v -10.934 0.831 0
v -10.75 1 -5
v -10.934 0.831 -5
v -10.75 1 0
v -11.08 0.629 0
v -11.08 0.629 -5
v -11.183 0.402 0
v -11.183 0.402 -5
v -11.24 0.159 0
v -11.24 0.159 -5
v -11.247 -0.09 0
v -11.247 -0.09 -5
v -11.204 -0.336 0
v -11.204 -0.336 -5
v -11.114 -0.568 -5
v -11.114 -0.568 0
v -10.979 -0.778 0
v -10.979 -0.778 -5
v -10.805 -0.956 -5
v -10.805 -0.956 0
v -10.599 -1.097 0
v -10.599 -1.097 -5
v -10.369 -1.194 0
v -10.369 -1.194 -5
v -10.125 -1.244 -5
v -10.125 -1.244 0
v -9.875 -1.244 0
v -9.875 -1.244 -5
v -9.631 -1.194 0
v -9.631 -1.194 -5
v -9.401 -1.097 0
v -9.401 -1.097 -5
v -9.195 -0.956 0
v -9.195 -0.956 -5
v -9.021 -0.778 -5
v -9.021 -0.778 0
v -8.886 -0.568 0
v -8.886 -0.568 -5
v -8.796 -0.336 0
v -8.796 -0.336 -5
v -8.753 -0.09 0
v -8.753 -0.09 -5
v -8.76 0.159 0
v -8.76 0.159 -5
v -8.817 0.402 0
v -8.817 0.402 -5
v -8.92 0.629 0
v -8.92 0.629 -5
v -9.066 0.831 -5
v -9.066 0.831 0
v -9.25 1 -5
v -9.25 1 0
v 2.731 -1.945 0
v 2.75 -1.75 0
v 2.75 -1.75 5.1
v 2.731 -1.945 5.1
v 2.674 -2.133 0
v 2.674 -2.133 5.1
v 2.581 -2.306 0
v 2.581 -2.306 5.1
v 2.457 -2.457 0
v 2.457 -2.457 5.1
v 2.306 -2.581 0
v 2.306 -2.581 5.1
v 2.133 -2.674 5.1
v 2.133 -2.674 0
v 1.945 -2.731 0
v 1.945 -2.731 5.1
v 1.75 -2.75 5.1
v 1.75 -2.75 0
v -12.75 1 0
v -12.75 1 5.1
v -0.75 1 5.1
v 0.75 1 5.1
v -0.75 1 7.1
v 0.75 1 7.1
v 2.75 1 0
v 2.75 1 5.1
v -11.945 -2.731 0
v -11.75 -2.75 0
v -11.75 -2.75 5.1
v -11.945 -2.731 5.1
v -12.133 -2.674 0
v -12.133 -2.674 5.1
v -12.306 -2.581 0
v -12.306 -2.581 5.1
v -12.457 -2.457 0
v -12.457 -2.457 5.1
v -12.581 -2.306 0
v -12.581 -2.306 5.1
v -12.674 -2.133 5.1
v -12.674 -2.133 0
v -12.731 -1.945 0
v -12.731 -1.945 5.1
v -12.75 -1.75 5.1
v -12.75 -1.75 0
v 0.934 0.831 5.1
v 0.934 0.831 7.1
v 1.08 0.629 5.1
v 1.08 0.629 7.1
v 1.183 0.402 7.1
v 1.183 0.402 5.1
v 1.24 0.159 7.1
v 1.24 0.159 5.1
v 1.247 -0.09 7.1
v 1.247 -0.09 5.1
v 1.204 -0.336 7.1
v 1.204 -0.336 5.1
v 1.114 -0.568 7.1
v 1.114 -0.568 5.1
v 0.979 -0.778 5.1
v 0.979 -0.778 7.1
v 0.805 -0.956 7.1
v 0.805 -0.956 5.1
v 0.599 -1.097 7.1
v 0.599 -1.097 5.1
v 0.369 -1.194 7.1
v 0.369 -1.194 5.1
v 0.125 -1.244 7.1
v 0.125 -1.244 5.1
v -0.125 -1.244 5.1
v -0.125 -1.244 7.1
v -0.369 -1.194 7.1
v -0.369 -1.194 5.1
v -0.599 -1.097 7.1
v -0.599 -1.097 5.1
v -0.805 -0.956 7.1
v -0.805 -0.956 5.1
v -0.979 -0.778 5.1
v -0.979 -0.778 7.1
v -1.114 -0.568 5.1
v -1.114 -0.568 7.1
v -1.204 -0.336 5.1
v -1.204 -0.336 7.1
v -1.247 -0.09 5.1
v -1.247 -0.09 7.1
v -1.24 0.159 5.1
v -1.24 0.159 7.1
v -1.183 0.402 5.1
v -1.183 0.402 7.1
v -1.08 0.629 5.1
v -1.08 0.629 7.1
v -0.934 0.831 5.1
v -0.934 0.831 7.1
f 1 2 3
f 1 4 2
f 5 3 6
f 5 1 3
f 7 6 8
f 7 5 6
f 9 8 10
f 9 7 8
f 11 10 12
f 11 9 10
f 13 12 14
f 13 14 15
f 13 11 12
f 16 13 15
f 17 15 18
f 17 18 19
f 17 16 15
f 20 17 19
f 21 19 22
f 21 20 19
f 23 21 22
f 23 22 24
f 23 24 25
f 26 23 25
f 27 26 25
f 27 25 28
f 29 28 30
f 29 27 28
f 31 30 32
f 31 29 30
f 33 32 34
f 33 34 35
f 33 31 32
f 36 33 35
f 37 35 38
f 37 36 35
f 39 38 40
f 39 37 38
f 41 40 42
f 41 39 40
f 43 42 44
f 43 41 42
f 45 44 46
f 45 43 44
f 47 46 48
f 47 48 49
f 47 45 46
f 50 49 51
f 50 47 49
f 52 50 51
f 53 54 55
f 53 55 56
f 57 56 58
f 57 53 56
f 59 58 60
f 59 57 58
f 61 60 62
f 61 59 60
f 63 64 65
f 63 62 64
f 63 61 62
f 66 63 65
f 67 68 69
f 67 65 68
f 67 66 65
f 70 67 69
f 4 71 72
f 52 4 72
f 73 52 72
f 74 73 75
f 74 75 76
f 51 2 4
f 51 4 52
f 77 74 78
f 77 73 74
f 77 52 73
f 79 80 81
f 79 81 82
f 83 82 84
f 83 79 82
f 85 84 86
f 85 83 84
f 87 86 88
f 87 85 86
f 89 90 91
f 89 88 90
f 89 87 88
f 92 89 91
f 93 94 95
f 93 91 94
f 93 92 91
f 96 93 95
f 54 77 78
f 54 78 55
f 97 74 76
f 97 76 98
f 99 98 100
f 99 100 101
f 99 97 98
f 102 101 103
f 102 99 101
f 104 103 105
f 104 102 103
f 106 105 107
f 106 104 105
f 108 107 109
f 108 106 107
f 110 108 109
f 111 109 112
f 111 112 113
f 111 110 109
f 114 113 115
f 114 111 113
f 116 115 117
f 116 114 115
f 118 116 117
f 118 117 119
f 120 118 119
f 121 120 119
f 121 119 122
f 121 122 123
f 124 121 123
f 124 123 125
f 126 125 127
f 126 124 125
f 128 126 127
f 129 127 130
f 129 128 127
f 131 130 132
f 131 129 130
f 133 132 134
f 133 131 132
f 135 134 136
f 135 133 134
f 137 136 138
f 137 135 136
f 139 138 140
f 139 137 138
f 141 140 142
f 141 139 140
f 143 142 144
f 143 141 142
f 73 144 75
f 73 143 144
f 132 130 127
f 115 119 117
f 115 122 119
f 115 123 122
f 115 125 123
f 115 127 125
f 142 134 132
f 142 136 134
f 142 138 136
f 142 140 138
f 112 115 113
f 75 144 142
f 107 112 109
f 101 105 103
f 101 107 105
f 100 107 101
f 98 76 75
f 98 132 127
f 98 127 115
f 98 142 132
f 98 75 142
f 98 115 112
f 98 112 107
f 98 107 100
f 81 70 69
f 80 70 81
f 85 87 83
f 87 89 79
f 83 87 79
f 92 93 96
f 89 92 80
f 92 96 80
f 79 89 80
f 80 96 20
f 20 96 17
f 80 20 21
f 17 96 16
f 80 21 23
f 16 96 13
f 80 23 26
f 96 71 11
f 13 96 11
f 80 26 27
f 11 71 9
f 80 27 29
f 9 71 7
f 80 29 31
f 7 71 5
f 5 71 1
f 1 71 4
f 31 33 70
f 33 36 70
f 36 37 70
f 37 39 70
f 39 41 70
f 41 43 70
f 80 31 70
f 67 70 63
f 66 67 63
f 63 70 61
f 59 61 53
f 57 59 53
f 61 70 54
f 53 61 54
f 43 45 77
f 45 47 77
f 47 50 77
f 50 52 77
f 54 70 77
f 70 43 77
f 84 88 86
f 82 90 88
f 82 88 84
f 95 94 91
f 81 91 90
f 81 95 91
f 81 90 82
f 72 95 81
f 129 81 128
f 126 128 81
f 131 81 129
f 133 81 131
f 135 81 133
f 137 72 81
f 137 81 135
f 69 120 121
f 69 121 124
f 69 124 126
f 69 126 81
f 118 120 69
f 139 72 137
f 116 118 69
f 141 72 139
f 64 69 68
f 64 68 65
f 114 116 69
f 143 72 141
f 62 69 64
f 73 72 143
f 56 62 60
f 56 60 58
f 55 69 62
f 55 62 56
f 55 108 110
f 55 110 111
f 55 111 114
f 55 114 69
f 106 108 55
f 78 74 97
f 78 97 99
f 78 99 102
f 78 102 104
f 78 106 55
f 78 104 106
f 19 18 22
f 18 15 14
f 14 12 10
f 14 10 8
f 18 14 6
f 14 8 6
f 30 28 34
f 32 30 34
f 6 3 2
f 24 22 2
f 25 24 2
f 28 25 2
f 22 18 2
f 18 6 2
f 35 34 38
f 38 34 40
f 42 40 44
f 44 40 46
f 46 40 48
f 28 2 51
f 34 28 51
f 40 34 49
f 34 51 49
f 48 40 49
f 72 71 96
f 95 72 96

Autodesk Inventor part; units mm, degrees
ref_plane "YZ Plane" through (0, 0, 0) normal (1, 0, 0) x (0, 1, 0)
ref_plane "XZ Plane" through (0, 0, 0) normal (0, 1, 0) x (-1, 0, 0)
ref_plane "XY Plane" through (0, 0, 0) normal (0, 0, 1) x (1, 0, 0)
sketch "Sketch1" plane through (0, 0, 0) normal (0, 0, 1) x (1, 0, 0)
  circle A0 centre (0, 0) radius 1.25
  circle A1 centre (0, 0) radius 2.75
  line L0 (-1.75, 2.75) -> (1.75, 2.75)
  line L1 (2.75, 1.75) -> (2.75, -1.75)
  line L2 (1.75, -2.75) -> (-1.75, -2.75)
  line L3 (-2.75, -1.75) -> (-2.75, 1.75)
  arc A2 (-1.75, 2.75) -> (-2.75, 1.75) centre (-1.75, 1.75) ccw
  arc A3 (2.75, 1.75) -> (1.75, 2.75) centre (1.75, 1.75) ccw
  arc A4 (1.75, -2.75) -> (2.75, -1.75) centre (1.75, -1.75) ccw
  arc A5 (-2.75, -1.75) -> (-1.75, -2.75) centre (-1.75, -1.75) ccw
  line L4 (-2.75, 1) -> (2.75, 1)
  line L5 (0, 2.75) -> (-11.75, 2.75)
  line L6 (-12.75, 1.75) -> (-12.75, -1.75)
  line L7 (-11.75, -2.75) -> (0, -2.75)
  line L8 (0, -2.75) -> (0, 2.75)
  circle A6 centre (-10, 0) radius 2.75
  circle A7 centre (-10, 0) radius 1.25
  line L9 (-2.75, 1) -> (-12.75, 1)
  arc A8 (-11.75, 2.75) -> (-12.75, 1.75) centre (-11.75, 1.75) ccw
  arc A9 (-12.75, -1.75) -> (-11.75, -2.75) centre (-11.75, -1.75) ccw
  point P0 (-2.75, 0)
  point P1 (0, -2.75)
  point P2 (0.75, 1)
  point P3 (-0.75, 1)
  point P4 (0, 0)
  point P5 (-9.25, 1)
  point P6 (-10.75, 1)
  dimension "d0" = 2.5
  dimension "d1" = 5.5
  dimension "d2" = 1
  dimension "d3" = 1
  dimension "d4" = 1
  dimension "d11" = 1
  dimension "d12" = 2.5
  dimension "d13" = 10
  dimension "d14" = 1
extrude "Extrusion1" add sketch "Sketch1" along normal blind 7.1 contours A0 L8 L4 | A0 L4 L8 picked at (0.0927, -0.4896) picked at (-0.103, -0.4871)
extrude "Extrusion2" add sketch "Sketch1" along normal blind 5.1 contours A0 L8 L4 | A0 L4 A1 L8 | L8 A1 L4 A0 | A0 L4 L8 | L4 L1 A1 | L2 A5 L3 A1 | A1 L1 A4 L2 | A1 L3 L4 | L3 A5 L7 A6 L9 | L7 A9 L6 A6 | A6 L9 A7 | L6 L9 A6 | A7 L9 picked at (0.0927, -0.4896) picked at (2.2166, -0.2967) picked at (-0.204, -2.227) picked at (-0.103, -0.4871) picked at (-7.773, -0.204) picked at (-10.4044, -0.1231)
extrude "Extrusion3" add sketch "Sketch1" against normal blind 5 contours A7 L9 picked at (-10.4044, -0.1231)
equation "\"d12\" = d0"
properties part number "rpi_base_front_3DPrint"
